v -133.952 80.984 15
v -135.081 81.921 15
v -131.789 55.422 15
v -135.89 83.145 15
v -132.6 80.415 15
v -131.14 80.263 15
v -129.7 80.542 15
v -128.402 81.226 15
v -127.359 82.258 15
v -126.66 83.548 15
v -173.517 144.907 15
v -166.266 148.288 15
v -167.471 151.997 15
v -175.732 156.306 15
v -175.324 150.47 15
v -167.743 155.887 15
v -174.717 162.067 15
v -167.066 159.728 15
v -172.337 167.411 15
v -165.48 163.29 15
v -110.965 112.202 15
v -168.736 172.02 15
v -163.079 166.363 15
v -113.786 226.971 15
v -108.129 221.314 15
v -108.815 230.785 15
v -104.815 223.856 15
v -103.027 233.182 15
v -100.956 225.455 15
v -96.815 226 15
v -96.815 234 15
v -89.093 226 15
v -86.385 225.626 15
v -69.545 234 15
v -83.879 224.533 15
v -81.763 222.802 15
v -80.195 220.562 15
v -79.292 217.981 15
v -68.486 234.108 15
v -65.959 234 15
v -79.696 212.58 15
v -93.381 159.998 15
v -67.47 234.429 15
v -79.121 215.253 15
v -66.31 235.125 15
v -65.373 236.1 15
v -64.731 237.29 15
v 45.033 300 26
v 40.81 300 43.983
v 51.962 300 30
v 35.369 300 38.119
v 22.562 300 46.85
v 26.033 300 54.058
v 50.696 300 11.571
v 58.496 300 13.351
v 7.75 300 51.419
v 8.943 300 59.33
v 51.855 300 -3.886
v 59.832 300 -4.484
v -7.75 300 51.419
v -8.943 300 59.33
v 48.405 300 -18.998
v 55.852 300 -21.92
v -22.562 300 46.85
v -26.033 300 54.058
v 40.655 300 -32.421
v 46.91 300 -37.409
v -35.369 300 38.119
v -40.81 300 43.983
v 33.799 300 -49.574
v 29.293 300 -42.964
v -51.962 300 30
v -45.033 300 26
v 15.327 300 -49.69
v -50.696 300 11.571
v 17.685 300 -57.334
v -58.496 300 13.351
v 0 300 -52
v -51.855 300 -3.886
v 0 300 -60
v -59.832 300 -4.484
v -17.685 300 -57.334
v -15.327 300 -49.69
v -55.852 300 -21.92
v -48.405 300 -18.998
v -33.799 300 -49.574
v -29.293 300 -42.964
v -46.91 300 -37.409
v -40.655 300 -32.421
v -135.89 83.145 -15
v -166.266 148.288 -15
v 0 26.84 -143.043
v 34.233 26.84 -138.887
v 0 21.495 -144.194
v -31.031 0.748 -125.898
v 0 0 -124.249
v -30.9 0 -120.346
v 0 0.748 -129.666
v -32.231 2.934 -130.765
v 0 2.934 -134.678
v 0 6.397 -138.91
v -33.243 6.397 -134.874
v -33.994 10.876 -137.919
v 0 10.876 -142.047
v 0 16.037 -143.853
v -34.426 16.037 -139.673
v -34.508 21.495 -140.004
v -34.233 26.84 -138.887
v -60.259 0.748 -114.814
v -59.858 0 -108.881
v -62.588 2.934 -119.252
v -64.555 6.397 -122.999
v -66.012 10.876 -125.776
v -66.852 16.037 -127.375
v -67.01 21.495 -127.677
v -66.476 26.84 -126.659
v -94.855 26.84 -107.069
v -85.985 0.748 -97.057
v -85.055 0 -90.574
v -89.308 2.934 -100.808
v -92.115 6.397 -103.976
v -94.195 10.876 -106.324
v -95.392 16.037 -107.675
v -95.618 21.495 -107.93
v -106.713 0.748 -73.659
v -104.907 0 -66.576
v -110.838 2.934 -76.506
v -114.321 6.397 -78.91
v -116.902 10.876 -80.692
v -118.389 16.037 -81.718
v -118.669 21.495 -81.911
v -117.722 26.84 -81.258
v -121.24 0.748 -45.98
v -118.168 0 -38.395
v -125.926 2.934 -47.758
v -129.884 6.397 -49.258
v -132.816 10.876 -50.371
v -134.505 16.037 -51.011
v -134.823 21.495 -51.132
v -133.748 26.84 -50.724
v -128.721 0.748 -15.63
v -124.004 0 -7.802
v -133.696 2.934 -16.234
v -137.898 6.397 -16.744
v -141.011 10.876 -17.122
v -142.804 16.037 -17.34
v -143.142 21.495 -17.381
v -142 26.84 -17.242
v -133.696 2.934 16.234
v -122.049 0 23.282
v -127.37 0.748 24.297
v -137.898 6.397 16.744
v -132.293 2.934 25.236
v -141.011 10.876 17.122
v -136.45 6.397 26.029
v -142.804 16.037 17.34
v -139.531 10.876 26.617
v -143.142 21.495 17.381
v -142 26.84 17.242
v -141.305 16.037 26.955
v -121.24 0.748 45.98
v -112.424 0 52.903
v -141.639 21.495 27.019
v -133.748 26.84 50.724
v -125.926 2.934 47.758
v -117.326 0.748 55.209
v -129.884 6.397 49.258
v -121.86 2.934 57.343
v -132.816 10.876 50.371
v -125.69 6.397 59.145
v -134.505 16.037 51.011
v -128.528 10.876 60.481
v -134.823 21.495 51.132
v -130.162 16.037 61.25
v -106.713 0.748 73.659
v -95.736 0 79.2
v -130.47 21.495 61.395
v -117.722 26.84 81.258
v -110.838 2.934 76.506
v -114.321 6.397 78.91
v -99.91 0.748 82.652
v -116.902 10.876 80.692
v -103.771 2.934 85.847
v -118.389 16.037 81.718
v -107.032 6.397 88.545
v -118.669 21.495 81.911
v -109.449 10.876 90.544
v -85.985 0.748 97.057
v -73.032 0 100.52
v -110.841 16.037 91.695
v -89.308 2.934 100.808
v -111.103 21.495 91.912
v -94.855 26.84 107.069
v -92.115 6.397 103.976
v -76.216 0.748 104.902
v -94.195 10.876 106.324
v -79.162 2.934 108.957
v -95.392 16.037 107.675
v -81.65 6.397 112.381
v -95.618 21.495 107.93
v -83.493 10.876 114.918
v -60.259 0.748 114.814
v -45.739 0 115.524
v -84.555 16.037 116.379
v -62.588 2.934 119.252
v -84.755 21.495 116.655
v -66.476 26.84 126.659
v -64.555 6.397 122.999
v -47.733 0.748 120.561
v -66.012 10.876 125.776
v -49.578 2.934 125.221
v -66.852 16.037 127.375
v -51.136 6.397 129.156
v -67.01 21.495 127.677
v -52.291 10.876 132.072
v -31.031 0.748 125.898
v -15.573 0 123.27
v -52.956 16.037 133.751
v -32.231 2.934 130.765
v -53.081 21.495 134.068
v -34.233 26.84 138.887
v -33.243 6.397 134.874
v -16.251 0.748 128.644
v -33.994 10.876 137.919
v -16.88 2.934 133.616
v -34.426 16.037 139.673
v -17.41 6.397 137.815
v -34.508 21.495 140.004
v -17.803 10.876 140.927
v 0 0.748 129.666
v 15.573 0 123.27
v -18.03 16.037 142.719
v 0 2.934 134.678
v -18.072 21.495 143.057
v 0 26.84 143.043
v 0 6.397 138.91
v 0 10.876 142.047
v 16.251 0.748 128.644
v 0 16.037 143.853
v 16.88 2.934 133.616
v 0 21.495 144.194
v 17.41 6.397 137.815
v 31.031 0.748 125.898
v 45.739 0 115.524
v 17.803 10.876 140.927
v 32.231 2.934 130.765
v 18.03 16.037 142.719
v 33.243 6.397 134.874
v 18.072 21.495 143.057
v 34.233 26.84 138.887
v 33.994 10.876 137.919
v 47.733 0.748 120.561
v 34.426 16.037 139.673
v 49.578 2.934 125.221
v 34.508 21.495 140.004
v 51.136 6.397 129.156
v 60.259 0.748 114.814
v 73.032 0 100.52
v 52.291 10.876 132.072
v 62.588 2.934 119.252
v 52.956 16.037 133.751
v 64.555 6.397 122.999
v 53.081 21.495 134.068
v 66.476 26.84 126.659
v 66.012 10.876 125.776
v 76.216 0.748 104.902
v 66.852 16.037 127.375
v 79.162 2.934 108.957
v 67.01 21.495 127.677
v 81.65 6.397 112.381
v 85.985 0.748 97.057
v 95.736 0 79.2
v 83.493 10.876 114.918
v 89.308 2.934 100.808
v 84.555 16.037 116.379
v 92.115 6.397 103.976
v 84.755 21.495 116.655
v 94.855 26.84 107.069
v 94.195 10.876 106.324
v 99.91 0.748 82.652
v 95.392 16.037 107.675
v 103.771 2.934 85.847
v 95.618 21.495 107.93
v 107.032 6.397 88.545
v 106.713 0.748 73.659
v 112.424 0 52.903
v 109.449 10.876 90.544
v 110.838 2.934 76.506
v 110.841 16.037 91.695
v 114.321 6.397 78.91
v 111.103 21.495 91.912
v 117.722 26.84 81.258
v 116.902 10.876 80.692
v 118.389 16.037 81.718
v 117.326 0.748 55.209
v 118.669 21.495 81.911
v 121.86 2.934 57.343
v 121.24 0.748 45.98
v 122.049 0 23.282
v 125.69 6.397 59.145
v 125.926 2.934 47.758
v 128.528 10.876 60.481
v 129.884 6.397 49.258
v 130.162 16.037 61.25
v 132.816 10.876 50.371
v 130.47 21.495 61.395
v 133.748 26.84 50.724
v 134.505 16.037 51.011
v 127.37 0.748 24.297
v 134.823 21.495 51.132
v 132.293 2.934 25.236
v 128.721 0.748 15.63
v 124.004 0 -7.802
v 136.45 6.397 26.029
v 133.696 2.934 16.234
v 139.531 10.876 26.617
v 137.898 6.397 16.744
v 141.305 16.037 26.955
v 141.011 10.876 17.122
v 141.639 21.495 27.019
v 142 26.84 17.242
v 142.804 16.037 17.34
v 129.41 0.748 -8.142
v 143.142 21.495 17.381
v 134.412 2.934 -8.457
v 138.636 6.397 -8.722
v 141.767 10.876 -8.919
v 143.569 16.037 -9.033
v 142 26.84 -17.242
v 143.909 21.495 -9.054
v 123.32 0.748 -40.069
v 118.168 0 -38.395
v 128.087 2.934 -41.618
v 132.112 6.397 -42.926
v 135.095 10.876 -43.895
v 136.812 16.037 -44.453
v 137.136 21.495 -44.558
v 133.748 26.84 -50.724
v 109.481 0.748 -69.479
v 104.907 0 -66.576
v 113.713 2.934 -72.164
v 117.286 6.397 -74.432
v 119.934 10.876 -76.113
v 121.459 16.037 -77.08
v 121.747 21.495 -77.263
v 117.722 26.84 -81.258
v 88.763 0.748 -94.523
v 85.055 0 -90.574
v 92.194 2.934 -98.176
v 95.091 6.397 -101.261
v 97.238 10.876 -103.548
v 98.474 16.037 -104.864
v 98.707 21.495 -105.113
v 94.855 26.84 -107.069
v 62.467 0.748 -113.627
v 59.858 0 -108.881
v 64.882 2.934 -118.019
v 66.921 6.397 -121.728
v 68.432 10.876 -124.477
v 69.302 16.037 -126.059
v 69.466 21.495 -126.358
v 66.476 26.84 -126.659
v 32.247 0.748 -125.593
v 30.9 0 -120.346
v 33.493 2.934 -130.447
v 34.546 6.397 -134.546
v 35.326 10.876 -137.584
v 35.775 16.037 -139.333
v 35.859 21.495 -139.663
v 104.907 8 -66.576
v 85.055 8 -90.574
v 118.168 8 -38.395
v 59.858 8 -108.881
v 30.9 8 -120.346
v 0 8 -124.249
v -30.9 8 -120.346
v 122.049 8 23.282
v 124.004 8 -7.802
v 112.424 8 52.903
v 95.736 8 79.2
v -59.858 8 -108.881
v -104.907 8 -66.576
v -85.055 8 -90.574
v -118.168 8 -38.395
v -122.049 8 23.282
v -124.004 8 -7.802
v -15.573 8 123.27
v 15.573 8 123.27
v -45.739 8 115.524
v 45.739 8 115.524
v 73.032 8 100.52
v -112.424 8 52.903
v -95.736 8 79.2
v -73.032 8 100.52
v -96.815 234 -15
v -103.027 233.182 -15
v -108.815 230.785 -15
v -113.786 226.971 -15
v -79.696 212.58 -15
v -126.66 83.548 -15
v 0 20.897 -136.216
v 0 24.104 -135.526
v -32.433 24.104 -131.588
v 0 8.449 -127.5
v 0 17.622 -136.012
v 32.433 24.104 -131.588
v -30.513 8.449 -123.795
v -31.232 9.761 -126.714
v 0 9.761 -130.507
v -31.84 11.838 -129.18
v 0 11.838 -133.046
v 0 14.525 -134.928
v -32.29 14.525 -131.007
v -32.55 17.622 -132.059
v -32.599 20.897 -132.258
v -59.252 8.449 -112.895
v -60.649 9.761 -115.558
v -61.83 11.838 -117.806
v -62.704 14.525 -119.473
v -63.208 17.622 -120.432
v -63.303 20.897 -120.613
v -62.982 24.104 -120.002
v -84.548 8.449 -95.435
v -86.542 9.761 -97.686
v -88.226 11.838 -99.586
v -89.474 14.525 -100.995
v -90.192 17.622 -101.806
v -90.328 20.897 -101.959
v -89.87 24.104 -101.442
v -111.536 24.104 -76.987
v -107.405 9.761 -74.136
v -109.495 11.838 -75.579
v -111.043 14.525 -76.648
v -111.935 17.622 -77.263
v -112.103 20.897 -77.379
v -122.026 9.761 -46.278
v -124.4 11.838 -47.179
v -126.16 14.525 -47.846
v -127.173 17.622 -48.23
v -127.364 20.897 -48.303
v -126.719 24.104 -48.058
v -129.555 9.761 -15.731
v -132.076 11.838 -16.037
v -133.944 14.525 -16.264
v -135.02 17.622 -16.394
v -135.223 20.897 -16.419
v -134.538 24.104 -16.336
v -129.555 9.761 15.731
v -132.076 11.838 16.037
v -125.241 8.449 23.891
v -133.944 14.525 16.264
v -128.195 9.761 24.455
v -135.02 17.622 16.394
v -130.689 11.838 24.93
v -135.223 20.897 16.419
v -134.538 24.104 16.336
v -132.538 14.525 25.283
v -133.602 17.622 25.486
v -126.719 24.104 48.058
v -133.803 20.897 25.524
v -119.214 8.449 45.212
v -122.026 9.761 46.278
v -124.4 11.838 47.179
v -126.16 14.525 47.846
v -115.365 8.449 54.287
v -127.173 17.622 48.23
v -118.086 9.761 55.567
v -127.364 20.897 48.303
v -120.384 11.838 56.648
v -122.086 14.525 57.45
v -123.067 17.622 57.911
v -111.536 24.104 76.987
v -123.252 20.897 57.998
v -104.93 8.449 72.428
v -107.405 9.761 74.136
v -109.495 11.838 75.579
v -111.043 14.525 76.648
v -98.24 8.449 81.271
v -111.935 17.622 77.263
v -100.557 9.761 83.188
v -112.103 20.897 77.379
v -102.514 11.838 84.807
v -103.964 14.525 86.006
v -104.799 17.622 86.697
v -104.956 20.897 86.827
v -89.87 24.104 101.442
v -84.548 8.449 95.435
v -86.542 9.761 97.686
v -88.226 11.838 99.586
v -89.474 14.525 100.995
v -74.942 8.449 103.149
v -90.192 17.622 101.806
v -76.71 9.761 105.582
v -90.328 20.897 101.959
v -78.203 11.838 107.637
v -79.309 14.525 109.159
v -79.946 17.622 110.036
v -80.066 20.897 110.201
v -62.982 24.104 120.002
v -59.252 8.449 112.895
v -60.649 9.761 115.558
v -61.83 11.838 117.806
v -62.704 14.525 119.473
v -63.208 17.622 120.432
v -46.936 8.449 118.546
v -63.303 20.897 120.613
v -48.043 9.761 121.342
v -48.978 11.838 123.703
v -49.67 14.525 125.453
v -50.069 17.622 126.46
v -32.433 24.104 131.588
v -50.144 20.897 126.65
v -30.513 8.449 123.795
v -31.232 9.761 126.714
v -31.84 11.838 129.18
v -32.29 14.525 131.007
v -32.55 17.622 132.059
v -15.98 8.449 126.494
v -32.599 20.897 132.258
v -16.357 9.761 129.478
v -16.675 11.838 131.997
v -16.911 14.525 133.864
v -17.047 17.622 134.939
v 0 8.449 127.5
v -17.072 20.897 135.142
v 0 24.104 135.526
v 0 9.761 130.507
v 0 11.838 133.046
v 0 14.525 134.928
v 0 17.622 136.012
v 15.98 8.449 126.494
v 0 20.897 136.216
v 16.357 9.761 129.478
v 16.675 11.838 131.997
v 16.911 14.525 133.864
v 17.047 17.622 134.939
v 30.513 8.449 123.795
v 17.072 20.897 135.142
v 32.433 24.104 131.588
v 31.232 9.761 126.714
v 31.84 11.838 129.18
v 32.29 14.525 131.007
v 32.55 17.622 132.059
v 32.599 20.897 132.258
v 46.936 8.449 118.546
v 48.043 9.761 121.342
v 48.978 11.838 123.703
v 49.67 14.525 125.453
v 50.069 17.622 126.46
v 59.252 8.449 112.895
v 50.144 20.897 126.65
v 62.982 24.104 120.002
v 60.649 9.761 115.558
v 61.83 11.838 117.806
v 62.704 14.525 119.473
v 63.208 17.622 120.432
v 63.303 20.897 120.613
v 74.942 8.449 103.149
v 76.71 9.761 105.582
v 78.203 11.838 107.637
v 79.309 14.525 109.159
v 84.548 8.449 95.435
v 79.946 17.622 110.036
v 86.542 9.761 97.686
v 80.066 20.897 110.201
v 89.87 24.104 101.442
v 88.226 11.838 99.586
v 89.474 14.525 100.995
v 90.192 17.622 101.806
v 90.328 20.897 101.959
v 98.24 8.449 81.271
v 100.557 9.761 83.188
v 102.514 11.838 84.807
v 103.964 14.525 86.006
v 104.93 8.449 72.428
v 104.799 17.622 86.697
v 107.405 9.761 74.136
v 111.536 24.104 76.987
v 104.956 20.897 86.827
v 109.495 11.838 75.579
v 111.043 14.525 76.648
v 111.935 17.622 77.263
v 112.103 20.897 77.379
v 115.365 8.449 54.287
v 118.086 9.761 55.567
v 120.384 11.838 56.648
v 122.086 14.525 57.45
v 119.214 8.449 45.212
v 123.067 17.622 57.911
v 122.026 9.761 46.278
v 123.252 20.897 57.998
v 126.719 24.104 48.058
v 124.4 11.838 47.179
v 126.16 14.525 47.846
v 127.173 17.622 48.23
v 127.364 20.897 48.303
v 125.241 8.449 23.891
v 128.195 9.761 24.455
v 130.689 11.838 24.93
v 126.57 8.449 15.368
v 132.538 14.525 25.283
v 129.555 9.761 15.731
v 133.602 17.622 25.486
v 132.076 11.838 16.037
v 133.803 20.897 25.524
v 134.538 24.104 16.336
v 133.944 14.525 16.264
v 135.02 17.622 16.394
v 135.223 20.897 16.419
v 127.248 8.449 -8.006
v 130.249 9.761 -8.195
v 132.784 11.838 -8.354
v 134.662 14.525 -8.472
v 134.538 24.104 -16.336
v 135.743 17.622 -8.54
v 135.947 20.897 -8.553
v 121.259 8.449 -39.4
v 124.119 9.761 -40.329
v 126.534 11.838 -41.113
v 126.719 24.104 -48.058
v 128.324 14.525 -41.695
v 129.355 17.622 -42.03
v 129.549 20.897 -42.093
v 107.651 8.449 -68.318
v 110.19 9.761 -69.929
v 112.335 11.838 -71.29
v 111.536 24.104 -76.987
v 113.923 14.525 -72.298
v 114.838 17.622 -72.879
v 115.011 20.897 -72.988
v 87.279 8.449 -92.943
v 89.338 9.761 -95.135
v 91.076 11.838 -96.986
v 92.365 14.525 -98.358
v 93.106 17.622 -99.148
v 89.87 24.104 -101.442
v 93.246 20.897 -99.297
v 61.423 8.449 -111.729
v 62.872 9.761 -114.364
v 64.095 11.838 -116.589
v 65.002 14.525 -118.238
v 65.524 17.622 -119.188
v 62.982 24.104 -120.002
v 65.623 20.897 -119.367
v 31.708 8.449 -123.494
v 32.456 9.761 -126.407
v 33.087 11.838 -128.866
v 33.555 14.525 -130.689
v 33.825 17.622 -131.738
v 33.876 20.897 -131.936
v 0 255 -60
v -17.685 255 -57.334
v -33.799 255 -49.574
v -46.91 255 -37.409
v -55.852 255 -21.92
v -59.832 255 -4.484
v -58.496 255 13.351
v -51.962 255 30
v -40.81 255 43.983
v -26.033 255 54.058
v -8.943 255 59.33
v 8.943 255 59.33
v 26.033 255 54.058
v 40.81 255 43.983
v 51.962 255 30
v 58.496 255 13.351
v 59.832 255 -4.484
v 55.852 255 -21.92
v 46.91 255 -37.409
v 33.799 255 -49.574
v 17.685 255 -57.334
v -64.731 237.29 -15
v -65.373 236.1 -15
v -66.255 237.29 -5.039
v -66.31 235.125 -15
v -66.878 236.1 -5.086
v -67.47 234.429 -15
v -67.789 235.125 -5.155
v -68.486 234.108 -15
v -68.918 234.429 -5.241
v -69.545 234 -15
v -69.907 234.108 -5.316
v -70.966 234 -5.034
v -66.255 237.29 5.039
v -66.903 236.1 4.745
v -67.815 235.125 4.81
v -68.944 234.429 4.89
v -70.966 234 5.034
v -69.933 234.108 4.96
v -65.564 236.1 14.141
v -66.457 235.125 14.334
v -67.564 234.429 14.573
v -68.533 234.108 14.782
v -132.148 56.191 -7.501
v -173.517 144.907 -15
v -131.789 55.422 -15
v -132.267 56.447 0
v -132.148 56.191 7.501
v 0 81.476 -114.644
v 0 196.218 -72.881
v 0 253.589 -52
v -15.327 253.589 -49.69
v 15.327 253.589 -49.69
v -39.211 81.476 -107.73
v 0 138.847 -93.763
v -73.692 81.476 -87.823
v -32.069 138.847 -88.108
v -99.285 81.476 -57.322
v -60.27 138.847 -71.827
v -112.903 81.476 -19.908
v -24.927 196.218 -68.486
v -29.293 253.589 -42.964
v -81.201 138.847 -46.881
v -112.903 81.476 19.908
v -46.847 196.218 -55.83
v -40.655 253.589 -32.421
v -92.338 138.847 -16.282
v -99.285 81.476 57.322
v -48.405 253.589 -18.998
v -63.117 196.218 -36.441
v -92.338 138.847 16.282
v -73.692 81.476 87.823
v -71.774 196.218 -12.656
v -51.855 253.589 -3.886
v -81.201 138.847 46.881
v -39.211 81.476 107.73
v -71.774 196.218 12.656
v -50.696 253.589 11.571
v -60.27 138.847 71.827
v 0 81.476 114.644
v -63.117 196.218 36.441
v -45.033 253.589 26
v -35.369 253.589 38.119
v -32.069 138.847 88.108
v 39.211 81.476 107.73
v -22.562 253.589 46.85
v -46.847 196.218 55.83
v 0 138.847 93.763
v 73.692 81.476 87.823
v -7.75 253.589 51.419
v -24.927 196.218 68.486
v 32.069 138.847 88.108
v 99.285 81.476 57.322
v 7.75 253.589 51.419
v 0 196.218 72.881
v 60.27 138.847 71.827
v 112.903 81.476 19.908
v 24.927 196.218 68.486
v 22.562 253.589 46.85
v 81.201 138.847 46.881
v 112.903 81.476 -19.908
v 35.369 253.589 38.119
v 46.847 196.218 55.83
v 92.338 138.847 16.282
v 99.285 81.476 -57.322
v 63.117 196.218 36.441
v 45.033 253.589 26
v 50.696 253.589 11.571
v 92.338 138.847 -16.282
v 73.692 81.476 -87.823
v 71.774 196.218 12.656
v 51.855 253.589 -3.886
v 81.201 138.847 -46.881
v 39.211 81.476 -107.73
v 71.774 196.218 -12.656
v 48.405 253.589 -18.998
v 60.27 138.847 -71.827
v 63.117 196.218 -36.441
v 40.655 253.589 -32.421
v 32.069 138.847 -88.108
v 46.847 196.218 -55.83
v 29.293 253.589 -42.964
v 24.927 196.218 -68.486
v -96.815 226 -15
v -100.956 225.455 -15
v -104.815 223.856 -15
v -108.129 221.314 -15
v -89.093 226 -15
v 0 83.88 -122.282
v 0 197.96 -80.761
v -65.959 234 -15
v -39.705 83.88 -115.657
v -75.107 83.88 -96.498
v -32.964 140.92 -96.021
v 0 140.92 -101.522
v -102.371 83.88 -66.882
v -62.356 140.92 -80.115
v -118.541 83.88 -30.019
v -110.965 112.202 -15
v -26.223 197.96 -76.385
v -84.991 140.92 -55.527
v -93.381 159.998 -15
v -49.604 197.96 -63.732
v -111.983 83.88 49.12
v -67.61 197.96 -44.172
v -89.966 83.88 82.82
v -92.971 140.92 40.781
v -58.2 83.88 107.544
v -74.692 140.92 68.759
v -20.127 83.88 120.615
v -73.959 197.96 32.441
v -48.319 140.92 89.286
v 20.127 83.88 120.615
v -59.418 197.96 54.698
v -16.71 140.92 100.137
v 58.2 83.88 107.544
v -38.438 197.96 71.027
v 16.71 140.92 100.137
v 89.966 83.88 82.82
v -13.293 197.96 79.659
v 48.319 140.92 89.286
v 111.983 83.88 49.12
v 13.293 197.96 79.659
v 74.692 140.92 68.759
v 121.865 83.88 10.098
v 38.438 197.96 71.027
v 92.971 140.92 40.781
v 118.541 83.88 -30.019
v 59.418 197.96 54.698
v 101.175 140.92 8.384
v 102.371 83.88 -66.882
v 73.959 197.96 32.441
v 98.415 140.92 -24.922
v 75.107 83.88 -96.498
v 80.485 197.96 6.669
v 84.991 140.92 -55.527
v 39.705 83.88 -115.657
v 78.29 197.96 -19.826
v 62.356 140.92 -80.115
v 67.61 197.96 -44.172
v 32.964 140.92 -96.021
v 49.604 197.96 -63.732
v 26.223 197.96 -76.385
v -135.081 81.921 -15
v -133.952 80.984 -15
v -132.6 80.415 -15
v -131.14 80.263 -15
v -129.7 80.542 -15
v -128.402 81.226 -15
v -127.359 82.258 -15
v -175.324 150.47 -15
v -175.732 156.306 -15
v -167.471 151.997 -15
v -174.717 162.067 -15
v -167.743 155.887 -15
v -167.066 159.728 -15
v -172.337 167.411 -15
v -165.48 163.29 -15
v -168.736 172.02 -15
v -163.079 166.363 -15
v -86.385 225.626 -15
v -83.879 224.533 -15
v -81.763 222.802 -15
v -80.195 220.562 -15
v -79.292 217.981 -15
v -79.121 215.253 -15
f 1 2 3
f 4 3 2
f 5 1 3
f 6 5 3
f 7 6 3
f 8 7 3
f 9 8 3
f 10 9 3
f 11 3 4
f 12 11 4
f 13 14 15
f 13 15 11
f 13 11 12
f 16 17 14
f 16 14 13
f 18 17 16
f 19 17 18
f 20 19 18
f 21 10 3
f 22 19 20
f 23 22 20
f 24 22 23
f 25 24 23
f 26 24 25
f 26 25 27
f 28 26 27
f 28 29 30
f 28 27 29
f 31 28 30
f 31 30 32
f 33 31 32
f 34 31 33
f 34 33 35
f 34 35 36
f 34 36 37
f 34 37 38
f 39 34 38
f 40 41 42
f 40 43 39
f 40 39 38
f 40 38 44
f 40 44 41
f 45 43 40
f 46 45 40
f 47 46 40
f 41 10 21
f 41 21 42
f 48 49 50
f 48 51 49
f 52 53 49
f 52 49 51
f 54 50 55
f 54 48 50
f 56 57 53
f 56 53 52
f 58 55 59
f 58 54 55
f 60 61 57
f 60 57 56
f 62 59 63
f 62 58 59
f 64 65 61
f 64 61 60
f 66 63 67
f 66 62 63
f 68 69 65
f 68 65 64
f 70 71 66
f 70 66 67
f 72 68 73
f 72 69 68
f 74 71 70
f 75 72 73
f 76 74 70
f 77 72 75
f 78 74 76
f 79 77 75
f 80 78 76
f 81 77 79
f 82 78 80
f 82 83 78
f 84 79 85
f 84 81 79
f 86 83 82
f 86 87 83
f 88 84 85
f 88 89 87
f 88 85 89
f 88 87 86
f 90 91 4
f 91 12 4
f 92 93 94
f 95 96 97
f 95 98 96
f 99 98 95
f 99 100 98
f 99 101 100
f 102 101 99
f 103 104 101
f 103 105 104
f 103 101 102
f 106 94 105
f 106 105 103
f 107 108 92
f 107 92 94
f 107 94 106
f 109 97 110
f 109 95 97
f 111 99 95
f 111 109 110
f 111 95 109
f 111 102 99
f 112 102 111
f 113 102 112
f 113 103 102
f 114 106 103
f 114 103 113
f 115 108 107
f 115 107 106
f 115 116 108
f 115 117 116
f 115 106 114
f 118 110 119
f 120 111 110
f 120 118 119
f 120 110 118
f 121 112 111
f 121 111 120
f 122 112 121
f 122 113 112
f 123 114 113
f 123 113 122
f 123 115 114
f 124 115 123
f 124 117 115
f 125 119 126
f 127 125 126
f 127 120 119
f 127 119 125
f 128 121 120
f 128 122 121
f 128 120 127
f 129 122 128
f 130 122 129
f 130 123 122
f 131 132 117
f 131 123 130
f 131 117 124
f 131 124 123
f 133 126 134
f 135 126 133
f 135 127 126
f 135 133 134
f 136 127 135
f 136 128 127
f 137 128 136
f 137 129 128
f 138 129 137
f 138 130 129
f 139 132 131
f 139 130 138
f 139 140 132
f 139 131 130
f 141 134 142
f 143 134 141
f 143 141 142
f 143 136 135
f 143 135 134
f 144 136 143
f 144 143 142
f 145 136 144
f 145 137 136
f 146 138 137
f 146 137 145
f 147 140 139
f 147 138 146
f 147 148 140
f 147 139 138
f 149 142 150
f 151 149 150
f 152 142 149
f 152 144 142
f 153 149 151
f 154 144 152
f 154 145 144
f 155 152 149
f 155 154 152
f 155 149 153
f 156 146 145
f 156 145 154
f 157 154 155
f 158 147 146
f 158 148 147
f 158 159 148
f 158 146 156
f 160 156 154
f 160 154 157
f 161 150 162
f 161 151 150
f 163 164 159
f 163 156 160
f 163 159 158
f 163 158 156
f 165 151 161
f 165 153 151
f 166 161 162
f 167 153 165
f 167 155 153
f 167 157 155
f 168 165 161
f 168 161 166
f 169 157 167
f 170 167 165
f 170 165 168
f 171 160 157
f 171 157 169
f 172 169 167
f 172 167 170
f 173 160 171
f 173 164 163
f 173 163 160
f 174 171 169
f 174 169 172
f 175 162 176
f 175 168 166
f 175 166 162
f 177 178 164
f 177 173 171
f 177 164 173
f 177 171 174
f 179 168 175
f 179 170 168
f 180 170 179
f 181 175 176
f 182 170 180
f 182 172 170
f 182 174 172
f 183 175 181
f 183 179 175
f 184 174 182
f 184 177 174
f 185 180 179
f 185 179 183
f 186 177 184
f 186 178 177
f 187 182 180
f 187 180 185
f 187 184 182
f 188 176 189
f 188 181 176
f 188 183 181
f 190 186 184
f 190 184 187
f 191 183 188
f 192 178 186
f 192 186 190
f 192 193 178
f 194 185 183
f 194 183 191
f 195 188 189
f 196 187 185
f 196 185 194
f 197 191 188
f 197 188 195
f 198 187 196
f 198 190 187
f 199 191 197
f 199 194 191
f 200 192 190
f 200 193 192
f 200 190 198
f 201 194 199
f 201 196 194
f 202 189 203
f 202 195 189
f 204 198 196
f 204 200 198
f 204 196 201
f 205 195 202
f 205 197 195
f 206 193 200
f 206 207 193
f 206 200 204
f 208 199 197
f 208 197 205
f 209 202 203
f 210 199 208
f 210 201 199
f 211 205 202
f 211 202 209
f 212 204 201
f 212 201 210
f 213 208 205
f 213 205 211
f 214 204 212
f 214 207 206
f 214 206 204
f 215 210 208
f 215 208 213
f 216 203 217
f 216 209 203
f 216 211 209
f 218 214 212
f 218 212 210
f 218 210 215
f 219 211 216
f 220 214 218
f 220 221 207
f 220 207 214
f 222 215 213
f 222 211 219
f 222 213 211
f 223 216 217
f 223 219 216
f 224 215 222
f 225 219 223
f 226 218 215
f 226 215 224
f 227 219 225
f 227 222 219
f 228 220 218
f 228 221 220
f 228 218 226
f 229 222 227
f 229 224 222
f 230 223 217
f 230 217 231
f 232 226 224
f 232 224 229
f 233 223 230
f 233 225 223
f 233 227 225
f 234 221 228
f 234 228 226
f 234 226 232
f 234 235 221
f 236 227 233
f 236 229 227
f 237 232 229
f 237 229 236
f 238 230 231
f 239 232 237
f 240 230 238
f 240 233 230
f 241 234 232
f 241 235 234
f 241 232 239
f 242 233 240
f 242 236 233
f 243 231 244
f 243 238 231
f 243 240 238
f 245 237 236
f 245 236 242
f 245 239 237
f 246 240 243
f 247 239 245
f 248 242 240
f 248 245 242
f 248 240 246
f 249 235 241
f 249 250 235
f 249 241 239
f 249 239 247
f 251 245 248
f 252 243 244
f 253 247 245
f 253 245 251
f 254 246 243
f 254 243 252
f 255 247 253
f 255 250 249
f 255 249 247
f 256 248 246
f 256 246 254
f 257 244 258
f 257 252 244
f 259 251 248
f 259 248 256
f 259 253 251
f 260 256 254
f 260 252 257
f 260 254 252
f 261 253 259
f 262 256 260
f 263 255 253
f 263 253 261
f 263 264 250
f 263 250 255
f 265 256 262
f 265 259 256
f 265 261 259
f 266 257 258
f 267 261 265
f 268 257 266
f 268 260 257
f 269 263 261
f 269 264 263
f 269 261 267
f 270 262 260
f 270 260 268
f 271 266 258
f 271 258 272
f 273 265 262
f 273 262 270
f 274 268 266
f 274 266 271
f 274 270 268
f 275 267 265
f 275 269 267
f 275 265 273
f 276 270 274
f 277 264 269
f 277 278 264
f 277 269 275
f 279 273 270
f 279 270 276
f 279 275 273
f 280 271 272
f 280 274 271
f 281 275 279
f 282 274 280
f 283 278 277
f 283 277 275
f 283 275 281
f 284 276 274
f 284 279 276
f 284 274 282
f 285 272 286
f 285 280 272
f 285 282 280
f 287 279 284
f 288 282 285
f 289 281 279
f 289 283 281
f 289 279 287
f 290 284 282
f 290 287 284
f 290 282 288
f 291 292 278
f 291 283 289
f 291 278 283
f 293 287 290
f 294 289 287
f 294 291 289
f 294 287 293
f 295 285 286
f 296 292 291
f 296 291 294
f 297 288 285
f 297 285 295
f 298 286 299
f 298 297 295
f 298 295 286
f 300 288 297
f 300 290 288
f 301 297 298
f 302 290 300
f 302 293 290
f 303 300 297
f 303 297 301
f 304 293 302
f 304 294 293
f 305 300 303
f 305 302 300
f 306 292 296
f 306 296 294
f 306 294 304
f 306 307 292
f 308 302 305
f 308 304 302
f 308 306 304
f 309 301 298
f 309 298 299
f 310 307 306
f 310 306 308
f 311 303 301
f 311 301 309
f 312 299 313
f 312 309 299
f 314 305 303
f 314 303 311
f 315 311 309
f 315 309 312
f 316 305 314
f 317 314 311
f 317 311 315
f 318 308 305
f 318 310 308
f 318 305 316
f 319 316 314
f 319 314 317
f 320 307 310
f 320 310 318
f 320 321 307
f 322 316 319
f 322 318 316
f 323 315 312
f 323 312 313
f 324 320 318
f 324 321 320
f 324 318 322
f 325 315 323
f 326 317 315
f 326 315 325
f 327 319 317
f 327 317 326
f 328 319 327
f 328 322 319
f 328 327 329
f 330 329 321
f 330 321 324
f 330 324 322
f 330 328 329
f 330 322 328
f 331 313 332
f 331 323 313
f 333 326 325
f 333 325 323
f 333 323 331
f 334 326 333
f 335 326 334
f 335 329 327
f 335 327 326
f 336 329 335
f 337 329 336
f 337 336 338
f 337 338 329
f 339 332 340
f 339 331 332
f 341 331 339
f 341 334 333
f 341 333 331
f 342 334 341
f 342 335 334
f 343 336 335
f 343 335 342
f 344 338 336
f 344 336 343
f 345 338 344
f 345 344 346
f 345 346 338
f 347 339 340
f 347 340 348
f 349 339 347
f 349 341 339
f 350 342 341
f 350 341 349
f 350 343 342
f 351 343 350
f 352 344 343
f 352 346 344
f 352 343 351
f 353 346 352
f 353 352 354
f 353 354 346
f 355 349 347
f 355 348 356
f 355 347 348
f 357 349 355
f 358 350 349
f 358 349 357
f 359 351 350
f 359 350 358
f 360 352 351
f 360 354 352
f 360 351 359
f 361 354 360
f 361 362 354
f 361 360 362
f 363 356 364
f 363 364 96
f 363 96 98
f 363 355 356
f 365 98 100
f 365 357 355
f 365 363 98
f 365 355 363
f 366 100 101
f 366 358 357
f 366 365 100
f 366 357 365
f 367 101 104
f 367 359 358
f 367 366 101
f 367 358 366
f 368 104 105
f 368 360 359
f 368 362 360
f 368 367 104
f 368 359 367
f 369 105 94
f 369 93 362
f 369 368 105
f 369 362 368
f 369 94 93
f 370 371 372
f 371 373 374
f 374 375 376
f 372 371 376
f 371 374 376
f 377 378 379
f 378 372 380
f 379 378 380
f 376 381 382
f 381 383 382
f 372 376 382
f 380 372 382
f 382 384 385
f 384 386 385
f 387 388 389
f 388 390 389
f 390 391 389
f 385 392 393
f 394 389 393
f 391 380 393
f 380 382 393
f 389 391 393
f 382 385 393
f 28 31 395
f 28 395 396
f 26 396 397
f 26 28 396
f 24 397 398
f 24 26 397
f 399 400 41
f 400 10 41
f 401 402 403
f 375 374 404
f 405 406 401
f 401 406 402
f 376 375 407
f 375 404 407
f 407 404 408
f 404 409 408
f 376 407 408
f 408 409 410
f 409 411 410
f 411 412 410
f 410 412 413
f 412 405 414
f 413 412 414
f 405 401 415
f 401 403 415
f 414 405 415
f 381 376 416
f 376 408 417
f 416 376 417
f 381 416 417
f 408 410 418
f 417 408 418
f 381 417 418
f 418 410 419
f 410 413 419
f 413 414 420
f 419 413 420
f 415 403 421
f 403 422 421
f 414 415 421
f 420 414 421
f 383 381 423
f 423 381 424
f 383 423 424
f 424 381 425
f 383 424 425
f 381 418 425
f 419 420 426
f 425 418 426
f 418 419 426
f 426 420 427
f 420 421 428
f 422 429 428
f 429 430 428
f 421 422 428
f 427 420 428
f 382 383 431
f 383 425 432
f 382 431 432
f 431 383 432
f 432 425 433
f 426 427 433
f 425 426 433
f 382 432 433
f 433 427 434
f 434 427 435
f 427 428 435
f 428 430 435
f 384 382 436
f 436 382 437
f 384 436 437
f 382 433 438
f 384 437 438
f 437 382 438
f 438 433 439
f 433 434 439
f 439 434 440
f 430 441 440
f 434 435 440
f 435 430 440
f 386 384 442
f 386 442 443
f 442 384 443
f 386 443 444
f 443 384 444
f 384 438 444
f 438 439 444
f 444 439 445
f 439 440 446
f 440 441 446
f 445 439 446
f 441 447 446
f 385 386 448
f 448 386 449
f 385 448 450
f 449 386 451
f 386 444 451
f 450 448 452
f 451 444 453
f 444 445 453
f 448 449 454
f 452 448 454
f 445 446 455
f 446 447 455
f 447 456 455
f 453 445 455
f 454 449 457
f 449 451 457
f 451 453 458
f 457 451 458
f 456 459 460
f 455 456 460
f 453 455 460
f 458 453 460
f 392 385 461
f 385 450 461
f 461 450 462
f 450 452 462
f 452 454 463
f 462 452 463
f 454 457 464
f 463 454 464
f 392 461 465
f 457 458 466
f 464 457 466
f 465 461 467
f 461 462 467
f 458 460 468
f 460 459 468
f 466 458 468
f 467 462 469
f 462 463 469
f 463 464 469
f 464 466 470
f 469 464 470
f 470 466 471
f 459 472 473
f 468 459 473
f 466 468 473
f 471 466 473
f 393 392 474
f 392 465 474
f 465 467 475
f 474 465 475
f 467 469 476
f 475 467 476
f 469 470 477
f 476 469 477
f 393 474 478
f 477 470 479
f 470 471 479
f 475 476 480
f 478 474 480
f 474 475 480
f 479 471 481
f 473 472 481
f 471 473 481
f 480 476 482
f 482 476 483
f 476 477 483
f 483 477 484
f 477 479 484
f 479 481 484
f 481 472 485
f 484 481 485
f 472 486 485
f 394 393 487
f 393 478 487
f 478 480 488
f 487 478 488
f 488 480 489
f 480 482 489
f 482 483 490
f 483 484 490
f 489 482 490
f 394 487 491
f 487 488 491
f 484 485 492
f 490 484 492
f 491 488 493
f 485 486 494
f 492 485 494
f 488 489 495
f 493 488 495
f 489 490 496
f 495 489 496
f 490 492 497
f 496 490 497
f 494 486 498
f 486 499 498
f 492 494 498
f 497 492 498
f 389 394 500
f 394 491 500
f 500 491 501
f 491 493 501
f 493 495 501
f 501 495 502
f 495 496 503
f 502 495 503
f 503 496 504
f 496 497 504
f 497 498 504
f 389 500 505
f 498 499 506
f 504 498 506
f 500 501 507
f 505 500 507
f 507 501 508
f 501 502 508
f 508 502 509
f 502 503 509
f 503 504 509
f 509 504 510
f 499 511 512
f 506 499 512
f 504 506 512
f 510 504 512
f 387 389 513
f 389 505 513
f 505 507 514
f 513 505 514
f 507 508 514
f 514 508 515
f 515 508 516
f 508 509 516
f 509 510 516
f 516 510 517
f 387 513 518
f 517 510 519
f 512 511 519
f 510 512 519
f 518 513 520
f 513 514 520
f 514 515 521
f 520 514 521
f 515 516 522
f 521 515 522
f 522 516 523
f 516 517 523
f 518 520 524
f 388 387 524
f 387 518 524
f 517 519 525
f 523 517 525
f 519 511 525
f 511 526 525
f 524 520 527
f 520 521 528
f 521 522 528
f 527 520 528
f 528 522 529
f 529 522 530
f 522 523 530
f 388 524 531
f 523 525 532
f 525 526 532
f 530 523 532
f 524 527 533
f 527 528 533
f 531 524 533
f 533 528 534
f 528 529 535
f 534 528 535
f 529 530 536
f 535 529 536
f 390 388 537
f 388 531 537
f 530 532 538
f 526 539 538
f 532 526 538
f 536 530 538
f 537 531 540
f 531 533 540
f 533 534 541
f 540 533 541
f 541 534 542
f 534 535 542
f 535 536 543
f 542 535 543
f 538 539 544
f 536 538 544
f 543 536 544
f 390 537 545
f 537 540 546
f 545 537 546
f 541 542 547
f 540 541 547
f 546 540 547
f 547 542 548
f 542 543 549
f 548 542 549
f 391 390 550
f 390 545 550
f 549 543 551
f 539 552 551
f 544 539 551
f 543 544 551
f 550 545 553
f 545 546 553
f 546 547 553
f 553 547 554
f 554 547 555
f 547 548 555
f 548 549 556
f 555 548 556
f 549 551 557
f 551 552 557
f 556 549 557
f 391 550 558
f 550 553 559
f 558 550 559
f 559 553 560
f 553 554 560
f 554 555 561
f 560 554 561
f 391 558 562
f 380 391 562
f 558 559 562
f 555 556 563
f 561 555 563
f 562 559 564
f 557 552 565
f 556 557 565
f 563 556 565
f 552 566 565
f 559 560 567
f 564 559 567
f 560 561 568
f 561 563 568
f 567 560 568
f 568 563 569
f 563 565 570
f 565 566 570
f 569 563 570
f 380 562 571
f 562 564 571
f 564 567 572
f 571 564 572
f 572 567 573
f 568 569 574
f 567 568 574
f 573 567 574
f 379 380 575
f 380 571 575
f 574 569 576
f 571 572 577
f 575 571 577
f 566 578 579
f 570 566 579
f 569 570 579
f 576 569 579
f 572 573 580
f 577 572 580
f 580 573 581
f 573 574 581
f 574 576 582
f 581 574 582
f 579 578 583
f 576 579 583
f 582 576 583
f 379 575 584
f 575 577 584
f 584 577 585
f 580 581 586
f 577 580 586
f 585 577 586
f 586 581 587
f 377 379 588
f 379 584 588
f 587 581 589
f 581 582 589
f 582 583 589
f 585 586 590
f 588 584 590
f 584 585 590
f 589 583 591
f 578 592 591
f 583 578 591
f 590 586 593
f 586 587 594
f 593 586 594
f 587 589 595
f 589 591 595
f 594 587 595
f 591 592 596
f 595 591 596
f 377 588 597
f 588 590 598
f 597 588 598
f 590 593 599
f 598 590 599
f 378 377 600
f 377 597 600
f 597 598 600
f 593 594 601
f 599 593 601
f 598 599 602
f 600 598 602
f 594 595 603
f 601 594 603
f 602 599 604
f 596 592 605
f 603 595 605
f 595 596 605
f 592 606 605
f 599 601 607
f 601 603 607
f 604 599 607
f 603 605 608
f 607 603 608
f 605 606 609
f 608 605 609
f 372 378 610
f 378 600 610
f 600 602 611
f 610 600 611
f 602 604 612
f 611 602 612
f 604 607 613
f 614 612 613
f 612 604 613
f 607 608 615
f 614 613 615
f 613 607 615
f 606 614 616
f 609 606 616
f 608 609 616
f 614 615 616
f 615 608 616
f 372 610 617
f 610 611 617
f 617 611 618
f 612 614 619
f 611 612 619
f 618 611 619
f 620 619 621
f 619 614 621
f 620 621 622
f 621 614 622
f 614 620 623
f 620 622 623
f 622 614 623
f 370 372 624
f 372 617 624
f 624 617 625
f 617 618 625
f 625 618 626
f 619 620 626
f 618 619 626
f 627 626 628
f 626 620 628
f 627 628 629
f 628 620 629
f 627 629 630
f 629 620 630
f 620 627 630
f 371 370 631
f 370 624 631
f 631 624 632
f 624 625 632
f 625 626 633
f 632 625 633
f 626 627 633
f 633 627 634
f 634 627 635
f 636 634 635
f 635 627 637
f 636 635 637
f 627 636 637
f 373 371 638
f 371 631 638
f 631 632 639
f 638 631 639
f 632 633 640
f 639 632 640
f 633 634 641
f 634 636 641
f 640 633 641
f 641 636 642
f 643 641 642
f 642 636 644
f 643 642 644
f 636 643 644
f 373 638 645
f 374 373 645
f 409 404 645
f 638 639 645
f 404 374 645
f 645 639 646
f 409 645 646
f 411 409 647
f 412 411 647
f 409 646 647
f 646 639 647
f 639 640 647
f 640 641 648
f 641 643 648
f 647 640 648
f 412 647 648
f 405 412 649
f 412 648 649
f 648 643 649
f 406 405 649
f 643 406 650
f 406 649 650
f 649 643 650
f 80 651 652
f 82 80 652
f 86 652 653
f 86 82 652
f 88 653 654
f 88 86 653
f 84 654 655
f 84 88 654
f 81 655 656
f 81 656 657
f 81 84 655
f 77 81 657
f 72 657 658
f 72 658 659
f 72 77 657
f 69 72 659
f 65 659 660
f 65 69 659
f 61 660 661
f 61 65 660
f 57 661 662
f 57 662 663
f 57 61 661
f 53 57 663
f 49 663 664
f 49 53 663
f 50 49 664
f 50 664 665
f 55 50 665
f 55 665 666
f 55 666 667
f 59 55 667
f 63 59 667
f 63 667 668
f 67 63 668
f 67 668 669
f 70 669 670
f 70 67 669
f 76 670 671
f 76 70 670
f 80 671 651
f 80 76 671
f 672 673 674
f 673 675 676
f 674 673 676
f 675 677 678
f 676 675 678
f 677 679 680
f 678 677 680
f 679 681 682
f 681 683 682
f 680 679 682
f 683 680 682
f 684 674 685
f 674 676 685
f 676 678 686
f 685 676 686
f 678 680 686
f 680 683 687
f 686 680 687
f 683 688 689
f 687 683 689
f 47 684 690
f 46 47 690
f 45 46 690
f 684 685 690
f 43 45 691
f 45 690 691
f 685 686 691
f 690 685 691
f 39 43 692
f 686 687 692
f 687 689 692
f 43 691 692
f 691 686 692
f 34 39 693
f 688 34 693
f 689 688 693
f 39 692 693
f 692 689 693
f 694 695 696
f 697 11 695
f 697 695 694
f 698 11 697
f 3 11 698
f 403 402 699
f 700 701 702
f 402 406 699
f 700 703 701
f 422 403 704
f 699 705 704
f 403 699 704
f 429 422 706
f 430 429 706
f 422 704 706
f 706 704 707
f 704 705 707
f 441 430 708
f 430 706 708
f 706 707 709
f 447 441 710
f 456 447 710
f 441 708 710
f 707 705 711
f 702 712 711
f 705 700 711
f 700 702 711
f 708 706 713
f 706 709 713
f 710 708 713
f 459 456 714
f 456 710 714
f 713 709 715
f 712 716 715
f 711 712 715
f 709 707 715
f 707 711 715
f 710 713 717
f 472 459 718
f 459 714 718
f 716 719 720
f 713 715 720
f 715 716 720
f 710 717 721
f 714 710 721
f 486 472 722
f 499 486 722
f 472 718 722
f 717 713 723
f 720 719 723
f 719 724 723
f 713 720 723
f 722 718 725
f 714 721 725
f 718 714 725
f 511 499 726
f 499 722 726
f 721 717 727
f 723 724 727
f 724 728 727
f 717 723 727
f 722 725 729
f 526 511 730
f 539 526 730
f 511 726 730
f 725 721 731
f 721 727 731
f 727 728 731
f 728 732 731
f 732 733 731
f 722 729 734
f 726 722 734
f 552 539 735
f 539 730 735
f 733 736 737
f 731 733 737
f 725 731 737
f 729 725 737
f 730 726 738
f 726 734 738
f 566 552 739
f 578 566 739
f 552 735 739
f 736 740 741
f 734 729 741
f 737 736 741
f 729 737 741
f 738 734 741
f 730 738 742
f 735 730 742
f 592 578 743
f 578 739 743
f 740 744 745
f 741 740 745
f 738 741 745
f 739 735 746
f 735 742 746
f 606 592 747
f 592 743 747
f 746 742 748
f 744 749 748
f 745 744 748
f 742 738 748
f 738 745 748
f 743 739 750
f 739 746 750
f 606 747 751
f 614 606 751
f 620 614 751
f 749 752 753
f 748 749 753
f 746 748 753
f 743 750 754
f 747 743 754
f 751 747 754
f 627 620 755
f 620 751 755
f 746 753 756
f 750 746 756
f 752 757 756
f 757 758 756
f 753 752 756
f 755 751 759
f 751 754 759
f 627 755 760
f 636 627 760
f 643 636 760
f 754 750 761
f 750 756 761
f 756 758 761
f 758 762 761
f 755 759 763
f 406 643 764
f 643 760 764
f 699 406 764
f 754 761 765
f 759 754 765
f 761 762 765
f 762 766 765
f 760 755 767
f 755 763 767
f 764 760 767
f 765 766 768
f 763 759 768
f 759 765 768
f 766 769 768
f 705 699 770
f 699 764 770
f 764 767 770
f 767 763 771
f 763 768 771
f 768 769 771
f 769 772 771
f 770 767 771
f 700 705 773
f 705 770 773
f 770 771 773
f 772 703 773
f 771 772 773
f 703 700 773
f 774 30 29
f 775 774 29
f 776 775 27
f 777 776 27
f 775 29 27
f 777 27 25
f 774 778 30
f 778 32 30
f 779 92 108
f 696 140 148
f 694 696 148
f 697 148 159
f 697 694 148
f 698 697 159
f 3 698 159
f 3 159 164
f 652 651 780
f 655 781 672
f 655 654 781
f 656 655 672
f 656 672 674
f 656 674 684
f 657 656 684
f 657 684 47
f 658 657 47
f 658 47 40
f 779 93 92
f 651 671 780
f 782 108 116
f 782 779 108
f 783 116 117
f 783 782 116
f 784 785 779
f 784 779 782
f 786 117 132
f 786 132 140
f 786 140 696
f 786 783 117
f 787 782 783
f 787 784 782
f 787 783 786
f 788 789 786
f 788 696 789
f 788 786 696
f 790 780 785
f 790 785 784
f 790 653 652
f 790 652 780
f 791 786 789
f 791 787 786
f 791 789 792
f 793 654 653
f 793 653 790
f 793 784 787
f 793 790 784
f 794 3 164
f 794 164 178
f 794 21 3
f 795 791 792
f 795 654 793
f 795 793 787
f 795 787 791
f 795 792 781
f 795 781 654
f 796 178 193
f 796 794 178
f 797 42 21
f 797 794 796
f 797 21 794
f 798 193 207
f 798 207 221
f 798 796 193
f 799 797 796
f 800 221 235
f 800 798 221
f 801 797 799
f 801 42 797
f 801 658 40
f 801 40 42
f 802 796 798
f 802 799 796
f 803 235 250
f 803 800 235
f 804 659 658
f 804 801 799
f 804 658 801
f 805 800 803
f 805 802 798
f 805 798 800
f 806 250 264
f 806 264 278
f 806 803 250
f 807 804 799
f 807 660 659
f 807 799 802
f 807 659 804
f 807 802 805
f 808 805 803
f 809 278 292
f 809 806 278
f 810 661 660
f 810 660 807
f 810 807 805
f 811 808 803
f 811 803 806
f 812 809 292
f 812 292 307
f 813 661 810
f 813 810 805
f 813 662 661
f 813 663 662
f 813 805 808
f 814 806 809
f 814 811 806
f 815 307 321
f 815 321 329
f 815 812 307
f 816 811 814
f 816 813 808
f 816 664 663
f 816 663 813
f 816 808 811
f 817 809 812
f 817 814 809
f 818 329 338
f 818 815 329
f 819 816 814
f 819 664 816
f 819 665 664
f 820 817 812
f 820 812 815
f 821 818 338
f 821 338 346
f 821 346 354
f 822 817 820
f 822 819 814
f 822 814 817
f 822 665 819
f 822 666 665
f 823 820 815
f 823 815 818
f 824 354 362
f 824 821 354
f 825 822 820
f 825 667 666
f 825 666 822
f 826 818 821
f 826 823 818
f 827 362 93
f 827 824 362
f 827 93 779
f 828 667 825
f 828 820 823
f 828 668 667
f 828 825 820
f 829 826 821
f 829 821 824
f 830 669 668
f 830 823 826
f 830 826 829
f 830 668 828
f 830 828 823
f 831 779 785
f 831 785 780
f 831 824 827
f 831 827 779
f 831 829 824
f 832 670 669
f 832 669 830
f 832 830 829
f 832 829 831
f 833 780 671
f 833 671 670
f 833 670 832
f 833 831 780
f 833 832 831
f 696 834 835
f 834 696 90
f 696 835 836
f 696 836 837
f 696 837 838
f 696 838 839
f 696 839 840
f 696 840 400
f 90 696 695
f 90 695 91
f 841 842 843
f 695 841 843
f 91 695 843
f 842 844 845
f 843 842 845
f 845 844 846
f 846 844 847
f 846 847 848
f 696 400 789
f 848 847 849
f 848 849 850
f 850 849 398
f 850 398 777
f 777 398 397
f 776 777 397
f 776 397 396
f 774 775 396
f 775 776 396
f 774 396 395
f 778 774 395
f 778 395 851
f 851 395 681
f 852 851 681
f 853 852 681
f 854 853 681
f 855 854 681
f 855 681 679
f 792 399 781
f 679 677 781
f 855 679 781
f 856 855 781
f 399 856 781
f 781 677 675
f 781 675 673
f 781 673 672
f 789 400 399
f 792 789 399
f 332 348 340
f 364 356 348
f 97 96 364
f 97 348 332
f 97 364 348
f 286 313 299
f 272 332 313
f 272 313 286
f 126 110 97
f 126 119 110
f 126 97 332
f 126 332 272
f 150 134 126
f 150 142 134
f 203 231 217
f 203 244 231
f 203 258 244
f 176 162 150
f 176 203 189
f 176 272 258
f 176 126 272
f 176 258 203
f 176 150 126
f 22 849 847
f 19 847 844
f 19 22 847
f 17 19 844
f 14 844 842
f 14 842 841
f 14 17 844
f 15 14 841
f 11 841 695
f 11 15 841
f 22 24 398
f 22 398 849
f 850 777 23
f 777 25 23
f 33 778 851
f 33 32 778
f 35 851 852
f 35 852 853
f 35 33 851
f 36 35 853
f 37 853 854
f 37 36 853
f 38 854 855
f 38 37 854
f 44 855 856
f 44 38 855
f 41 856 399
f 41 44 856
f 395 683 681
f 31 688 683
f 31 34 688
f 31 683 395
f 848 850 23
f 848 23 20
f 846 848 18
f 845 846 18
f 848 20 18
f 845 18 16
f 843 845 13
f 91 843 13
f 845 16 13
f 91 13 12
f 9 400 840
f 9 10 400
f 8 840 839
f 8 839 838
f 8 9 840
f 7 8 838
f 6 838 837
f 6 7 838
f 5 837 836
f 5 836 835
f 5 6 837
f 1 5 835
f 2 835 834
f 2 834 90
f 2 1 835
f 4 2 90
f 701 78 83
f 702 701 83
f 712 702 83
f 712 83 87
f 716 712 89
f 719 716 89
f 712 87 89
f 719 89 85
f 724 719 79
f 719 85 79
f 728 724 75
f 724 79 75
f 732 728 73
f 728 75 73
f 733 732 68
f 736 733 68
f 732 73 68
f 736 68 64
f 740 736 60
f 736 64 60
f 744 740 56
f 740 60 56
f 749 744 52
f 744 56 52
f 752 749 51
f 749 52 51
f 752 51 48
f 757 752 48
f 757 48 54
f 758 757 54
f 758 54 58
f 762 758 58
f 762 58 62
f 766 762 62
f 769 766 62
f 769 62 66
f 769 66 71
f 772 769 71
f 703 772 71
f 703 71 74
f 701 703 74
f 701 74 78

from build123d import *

# Parameters (mm, degrees)
SKETCH_2_R          = 52
CUT_EXTRUDE_1_DEPTH = 292
EXTRUDE_2_DEPTH     = 15
FILLET_1_R          = 10
FILLET_2_R          = 5
FILLET_3_R          = 5


with BuildPart() as part:
    # 草图1 → 旋转2 (revolve)
    with BuildSketch(Plane.XY, mode=Mode.PRIVATE) as revolve_2_sk:
        with BuildLine():
            Line((0, 0), (-124.249449603, 0))
            ThreePointArc((-124.249449603, 0), (-140.632490489, 8.528471273), (-143.043302019, 26.840402867))
            Line((-143.043302019, 26.840402867), (-60, 255))
            Line((-60, 255), (-60, 300))
            Line((-60, 300), (0, 300))
            Line((0, 300), (0, 0))
        make_face()
        with BuildLine():
            Line((-8, 8), (-124.249449603, 8))
            ThreePointArc((-124.249449603, 8), (-134.079274135, 13.117082764), (-135.525761052, 24.10424172))
            Line((-135.525761052, 24.10424172), (-52, 253.589384154))
            Line((-52, 253.589384154), (-52, 292))
            Line((-52, 292), (-8, 292))
            Line((-8, 292), (-8, 8))
        make_face(mode=Mode.SUBTRACT)
    revolve(revolve_2_sk.sketch.rotate(Axis((0, -74.77110885, 0), (0, 1, 0)), 270), axis=Axis((0, -74.77110885, 0), (0, 1, 0)))

    # 草图2 → 切除-拉伸1 (cut)
    with BuildSketch(Plane(origin=(0, 300, 0), x_dir=(1, 0, 0), z_dir=(0, 1, 0))):
        with Locations(Location((0, 0, 0), (0, 0, 90))):
            Circle(SKETCH_2_R)
    extrude(amount=-CUT_EXTRUDE_1_DEPTH, mode=Mode.SUBTRACT)

    # 草图5 → 凸台-拉伸2 (add, symmetric)
    # profile 1 of 2: a face of its own
    with BuildSketch(Plane.XY):
        with BuildLine():
            Line((-63.38666383, 234), (-96.814984609, 234))
            ThreePointArc((-96.814984609, 234), (-105.999386986, 232.17310878), (-113.785547358, 226.970562748))
            Line((-113.785547358, 226.970562748), (-168.73593113, 172.020178976))
            ThreePointArc((-168.73593113, 172.020178976), (-175.400754454, 159.217172492), (-173.51675527, 144.906777946))
            Line((-173.51675527, 144.906777946), (-129.876648813, 51.320267637))
            Line((-129.876648813, 51.320267637), (-63.38666383, 234))
        make_face()
        with BuildLine():
            ThreePointArc((-96.814984609, 230), (-104.468653256, 228.47759065), (-110.957120233, 224.142135624))
            Line((-110.957120233, 224.142135624), (-165.907504005, 169.191751851))
            ThreePointArc((-165.907504005, 169.191751851), (-171.461523442, 158.522579781), (-169.891524122, 146.597250993))
            Line((-169.891524122, 146.597250993), (-130.332580622, 61.762822889))
            Line((-130.332580622, 61.762822889), (-69.099255857, 230))
            Line((-69.099255857, 230), (-96.814984609, 230))
        make_face(mode=Mode.SUBTRACT)
    # profile 2 of 2: a face of its own
    with BuildSketch(Plane.XY):
        with BuildLine():
            Line((-69.099255857, 230), (-96.814984609, 230))
            ThreePointArc((-96.814984609, 230), (-104.468653256, 228.47759065), (-110.957120233, 224.142135624))
            Line((-110.957120233, 224.142135624), (-165.907504005, 169.191751851))
            ThreePointArc((-165.907504005, 169.191751851), (-171.461523442, 158.522579781), (-169.891524122, 146.597250993))
            Line((-169.891524122, 146.597250993), (-130.332580622, 61.762822889))
            Line((-130.332580622, 61.762822889), (-69.099255857, 230))
        make_face()
        with BuildLine():
            ThreePointArc((-96.814984609, 226), (-102.937919527, 224.78207252), (-108.128693108, 221.313708499))
            Line((-108.128693108, 221.313708499), (-163.07907688, 166.363324727))
            ThreePointArc((-163.07907688, 166.363324727), (-167.52229243, 157.82798707), (-166.266292974, 148.28772404))
            Line((-166.266292974, 148.28772404), (-130.788512431, 72.20537814))
            Line((-130.788512431, 72.20537814), (-74.811847884, 226))
            Line((-74.811847884, 226), (-96.814984609, 226))
        make_face(mode=Mode.SUBTRACT)
    extrude(amount=EXTRUDE_2_DEPTH, both=True)

    # 圆角1
    fillet_1_edges = [part.edges().sort_by_distance(p)[0] for p in [
        (-74.811847884, 226, 0),
    ]]
    fillet(fillet_1_edges, radius=FILLET_1_R)

    # 圆角2
    fillet_2_edges = [part.edges().sort_by_distance(p)[0] for p in [
        (-130.788512431, 72.20537814, 0),
    ]]
    fillet(fillet_2_edges, radius=FILLET_2_R)

    # 圆角3
    fillet_3_edges = [part.edges().sort_by_distance(p)[0] for p in [
        (-67.64337492, 234, 0),
    ]]
    fillet(fillet_3_edges, radius=FILLET_3_R)


solid = part.part
